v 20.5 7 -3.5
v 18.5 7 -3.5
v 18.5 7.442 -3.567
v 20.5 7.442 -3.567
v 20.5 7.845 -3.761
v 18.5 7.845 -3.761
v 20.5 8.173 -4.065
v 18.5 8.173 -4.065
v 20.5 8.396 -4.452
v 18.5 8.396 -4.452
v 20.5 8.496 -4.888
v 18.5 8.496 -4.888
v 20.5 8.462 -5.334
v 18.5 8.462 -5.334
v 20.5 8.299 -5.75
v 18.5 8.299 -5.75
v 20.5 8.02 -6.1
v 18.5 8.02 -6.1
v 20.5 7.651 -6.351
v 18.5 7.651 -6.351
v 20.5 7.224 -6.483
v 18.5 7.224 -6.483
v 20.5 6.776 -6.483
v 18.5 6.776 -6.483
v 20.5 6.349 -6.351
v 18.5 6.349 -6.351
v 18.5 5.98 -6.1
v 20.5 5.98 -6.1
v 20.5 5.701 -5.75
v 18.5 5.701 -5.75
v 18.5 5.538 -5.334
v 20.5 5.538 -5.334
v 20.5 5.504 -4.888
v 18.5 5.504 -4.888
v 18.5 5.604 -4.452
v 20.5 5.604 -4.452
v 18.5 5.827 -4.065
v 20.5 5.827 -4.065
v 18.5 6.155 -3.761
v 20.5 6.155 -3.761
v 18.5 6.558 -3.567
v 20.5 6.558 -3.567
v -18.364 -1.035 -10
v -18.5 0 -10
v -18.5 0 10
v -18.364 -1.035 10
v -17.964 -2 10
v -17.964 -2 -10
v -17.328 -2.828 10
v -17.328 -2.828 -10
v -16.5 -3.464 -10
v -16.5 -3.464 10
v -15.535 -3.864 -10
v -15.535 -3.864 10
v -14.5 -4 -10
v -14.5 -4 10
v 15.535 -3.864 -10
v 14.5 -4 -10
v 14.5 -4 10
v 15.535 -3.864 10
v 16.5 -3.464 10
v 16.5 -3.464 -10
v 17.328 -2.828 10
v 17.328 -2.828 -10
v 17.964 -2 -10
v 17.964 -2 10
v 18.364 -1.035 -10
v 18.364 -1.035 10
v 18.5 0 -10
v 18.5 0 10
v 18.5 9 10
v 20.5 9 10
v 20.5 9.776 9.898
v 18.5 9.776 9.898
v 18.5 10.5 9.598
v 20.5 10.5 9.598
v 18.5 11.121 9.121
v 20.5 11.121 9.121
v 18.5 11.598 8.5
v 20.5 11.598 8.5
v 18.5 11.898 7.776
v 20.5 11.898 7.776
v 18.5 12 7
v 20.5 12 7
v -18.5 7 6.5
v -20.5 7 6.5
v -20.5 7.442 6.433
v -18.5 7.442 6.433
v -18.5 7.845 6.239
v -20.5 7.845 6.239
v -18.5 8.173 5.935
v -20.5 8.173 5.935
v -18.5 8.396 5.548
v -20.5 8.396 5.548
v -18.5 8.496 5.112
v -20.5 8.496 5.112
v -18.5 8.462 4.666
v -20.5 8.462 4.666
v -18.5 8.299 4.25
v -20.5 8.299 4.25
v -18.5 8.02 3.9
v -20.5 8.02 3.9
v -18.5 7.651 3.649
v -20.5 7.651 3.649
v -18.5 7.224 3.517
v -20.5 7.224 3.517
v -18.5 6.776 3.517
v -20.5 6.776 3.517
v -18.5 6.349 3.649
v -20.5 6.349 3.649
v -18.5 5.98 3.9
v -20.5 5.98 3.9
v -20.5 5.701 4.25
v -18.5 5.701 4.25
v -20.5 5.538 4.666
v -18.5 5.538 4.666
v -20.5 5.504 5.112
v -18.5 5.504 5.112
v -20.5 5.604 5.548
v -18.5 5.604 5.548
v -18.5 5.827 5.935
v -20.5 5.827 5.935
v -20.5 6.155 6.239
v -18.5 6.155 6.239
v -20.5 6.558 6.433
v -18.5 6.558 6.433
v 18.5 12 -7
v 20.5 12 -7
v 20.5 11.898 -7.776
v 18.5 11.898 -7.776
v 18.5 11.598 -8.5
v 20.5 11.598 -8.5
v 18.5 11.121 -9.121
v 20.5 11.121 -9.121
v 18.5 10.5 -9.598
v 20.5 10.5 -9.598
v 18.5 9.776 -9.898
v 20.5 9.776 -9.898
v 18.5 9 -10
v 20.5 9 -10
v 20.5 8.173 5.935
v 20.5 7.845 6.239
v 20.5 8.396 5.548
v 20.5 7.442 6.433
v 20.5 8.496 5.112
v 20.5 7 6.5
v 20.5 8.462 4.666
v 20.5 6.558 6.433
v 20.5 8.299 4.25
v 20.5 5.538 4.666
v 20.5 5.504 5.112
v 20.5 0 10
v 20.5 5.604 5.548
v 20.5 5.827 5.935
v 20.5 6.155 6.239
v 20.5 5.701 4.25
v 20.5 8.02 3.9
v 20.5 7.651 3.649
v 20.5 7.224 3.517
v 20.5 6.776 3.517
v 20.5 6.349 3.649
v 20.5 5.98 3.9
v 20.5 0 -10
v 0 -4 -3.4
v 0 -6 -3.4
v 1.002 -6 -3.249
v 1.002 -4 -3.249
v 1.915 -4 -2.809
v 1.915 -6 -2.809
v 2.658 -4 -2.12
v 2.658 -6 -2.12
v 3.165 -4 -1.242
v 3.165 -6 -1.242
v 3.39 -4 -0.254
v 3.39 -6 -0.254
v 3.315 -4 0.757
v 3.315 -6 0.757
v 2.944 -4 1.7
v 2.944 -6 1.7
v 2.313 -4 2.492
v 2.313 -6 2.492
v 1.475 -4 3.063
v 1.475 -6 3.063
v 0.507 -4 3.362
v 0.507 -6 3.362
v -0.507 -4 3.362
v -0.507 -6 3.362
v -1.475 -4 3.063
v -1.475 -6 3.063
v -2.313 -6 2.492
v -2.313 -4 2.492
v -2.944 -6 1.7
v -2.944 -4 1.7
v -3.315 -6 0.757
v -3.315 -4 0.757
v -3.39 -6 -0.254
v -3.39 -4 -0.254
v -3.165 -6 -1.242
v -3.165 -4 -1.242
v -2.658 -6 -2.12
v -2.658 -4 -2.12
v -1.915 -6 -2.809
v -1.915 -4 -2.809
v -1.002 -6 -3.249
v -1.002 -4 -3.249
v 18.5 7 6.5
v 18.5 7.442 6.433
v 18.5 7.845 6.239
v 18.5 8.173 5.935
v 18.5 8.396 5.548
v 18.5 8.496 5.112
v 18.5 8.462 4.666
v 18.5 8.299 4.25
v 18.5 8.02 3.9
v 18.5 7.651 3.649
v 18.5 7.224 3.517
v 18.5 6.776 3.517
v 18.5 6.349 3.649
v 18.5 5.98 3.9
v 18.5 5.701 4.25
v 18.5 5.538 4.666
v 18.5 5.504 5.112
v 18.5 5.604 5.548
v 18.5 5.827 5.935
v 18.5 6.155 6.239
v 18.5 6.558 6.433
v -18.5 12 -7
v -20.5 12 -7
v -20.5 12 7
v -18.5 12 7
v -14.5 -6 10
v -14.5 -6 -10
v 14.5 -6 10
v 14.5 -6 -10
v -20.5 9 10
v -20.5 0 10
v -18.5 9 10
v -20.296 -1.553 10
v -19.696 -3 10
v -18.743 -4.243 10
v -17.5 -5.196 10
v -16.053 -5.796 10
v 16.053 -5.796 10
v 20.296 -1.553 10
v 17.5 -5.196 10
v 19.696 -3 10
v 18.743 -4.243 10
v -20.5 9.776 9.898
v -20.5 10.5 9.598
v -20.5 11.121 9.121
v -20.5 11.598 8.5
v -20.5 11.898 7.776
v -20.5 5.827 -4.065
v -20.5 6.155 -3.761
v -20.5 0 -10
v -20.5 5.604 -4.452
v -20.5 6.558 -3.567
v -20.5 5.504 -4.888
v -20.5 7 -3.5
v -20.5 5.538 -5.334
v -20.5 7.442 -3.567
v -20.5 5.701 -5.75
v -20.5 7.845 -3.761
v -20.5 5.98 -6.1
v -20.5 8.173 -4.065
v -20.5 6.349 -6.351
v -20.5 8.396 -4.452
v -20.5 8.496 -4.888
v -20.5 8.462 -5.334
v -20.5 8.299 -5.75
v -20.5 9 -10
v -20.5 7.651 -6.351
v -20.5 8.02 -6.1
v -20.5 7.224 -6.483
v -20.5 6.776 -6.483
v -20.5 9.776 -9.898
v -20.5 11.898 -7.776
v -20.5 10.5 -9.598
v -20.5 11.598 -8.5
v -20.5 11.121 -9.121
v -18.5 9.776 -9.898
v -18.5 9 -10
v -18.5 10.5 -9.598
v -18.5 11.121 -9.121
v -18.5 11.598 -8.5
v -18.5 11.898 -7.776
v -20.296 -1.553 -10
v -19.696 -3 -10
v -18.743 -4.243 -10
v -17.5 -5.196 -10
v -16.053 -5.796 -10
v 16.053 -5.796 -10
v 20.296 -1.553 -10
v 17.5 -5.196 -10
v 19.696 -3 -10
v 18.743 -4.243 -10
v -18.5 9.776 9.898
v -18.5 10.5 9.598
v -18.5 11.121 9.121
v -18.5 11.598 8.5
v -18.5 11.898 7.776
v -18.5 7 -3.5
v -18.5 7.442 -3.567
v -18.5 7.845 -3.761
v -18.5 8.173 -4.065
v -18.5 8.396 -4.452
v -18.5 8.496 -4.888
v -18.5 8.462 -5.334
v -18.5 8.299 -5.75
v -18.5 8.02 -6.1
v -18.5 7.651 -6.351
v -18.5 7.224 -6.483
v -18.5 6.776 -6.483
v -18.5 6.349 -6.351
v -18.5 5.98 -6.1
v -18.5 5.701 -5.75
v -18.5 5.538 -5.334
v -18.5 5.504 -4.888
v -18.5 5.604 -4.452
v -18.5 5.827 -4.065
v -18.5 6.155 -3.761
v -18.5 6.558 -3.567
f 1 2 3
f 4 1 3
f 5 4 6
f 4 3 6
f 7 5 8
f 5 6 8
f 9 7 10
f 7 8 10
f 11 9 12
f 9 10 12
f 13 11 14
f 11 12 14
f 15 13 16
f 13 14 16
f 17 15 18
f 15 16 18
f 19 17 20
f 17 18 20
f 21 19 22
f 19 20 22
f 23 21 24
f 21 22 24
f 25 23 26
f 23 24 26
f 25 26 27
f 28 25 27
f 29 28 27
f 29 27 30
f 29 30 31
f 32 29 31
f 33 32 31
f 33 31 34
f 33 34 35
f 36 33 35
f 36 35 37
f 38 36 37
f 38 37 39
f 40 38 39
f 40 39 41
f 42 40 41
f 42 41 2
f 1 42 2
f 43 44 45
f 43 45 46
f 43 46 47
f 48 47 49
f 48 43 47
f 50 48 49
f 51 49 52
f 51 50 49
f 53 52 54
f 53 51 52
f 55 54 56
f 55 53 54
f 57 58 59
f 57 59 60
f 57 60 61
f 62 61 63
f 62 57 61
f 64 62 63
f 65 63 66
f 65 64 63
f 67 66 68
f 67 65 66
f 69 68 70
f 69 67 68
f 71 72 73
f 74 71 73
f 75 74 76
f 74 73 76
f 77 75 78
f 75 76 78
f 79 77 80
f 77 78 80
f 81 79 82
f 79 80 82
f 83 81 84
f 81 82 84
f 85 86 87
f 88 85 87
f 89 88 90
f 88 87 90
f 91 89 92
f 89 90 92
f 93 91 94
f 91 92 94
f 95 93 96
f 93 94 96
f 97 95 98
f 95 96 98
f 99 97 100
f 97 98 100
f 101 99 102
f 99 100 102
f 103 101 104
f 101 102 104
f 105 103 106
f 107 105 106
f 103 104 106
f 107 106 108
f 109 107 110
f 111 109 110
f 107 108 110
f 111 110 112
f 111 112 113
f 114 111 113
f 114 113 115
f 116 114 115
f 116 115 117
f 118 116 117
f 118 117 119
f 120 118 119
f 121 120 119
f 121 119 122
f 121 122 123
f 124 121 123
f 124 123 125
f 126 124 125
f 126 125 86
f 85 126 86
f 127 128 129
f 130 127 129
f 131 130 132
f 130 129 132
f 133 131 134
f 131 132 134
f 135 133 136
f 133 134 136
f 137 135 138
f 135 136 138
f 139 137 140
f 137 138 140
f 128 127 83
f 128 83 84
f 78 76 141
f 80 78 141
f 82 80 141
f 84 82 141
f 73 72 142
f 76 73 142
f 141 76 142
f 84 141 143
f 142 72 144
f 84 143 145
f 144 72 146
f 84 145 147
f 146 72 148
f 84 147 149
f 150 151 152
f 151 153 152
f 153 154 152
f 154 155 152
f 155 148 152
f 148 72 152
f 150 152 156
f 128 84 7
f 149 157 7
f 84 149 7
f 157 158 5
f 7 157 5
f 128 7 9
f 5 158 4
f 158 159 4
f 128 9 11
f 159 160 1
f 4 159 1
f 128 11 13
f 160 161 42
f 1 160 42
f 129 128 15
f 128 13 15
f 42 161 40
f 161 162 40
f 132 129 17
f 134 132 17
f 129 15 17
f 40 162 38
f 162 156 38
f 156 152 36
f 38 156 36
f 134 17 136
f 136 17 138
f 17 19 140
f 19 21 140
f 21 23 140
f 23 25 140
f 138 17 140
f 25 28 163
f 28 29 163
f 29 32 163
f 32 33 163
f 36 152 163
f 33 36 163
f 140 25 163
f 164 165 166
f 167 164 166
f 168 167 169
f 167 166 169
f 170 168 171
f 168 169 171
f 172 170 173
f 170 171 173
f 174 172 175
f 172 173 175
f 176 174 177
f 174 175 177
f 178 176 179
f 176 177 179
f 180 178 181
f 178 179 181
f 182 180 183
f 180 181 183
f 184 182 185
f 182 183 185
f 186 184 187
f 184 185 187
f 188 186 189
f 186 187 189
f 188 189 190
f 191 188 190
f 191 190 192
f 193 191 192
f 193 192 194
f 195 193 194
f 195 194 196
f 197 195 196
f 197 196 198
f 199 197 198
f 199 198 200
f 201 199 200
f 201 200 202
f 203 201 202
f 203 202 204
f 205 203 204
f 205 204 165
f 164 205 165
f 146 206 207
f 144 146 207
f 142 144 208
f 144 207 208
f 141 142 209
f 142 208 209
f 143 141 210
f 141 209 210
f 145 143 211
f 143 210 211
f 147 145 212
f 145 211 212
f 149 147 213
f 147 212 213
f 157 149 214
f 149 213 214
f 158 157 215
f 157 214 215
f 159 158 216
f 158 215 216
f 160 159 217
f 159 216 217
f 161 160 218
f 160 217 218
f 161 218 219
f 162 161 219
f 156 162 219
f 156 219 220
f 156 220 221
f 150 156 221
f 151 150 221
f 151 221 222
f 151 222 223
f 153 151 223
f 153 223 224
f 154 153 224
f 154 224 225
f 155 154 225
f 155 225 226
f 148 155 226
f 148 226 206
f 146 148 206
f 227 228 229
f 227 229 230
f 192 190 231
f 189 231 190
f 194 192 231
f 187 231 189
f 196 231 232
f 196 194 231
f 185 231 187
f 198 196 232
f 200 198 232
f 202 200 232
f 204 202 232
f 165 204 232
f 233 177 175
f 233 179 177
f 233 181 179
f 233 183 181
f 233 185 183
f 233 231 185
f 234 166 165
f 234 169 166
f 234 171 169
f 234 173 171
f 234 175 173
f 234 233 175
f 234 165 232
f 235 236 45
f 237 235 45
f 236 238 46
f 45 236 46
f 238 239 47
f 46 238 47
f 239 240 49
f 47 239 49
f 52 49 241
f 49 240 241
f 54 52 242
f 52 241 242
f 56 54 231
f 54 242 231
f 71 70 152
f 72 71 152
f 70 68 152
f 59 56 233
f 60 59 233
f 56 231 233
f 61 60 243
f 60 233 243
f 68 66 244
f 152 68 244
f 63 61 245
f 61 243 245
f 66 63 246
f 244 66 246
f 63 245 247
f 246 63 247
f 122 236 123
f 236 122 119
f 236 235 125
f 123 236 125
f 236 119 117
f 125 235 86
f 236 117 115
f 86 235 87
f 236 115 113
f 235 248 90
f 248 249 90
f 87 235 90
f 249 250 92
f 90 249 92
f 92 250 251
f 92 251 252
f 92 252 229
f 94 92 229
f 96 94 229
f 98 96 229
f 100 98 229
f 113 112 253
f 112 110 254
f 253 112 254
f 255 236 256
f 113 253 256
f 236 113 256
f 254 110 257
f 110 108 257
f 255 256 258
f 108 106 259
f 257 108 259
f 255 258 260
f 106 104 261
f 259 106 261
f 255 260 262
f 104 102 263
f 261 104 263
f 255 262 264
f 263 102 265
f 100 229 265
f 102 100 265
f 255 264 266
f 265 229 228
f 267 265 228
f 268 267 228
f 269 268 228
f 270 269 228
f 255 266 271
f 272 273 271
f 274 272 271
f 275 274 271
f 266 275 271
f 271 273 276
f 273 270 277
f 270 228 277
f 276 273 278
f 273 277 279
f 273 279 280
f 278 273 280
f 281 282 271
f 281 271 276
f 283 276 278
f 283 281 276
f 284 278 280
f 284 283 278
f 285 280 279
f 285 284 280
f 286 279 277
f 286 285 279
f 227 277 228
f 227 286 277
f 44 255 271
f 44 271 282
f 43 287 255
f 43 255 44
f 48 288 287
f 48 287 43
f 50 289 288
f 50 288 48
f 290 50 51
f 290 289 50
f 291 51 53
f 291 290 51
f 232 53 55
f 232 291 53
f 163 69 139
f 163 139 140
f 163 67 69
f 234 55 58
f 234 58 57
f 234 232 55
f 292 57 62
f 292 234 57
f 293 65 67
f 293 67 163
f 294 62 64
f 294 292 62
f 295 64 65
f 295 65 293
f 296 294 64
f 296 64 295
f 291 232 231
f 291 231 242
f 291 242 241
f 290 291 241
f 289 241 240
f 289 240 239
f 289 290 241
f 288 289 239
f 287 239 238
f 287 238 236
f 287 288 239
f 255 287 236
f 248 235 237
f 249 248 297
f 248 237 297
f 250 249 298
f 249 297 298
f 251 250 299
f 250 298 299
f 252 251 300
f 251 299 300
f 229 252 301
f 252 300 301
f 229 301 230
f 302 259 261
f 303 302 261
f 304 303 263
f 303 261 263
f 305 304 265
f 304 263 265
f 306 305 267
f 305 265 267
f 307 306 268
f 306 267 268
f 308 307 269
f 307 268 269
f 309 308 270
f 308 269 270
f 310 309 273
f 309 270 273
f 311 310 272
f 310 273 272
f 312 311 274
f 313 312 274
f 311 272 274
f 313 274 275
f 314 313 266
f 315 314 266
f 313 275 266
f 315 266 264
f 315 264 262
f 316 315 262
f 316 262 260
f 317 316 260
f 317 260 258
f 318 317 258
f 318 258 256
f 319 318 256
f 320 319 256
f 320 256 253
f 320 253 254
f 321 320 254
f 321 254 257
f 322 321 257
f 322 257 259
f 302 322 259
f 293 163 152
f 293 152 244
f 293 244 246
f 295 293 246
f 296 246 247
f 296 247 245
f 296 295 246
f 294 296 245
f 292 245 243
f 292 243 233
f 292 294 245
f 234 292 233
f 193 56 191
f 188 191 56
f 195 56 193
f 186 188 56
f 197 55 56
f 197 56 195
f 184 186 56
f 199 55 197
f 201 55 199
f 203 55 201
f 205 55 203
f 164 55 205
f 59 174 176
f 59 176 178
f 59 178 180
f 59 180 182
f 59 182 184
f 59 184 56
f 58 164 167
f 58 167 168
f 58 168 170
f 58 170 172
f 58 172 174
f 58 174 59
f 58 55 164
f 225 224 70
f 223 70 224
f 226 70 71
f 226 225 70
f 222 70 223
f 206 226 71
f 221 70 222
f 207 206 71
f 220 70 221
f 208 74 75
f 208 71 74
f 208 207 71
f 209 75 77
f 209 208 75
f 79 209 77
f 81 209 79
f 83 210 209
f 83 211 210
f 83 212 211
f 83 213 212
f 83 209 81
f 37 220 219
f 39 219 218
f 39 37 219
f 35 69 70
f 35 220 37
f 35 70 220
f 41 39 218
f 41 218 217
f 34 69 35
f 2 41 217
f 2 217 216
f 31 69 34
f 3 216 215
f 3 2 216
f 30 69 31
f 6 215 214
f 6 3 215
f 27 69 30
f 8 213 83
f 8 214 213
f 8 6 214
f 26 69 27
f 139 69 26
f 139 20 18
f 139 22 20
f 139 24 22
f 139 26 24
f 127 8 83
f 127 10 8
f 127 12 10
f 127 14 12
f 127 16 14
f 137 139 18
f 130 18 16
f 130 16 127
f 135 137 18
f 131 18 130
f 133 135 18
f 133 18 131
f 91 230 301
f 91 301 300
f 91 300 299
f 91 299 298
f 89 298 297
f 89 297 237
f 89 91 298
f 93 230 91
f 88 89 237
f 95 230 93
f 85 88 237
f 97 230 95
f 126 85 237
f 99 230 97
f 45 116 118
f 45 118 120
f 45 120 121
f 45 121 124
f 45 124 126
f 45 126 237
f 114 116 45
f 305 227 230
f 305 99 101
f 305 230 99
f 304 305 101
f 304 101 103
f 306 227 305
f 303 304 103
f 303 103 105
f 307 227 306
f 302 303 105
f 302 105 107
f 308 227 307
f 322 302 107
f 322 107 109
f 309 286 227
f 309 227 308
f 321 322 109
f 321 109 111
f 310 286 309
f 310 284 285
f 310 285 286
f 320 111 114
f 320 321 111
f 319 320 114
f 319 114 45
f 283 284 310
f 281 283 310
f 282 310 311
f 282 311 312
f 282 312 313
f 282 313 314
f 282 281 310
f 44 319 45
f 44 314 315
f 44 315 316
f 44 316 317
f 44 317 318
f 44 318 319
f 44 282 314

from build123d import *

# Parameters (mm, degrees)
SKETCH1_W            = 20
SKETCH1_H            = 6
BOSS_EXTRUDE1_DEPTH  = 20.5
SKETCH2_W            = 3
SKETCH2_H            = 20
BOSS_EXTRUDE2_DEPTH  = 12
SKETCH7_R            = 1.5
CUT_EXTRUDE1_DEPTH   = 44.874821937
SKETCH8_R            = 3.4
CUT_EXTRUDE2_DEPTH   = 30.055980452
FILLET2_R            = 3
CONVERT_SOLID2_START = -10
CONVERT_SOLID2_DEPTH = 20


# Read off the part's stored shape, not the designer's step: Convert-Solid2
with BuildPart() as part:
    # Sketch1 → Boss-Extrude1 (new, symmetric)
    with BuildSketch(Plane(origin=(0, 0, 0), x_dir=(0, 0, -1), z_dir=(1, 0, 0))):
        with Locations((0, -3)):
            Rectangle(SKETCH1_W, SKETCH1_H)
    extrude(amount=BOSS_EXTRUDE1_DEPTH, both=True)

    # Sketch2 → Boss-Extrude2 (add)
    with BuildSketch(Plane(origin=(0, 0, 0), x_dir=(1, 0, 0), z_dir=(0, 1, 0))):
        with Locations((19, 0)):
            Rectangle(SKETCH2_W, SKETCH2_H)
        with Locations((-19, 0)):
            Rectangle(SKETCH2_W, SKETCH2_H)
    extrude(amount=BOSS_EXTRUDE2_DEPTH)

    # Sketch7 → Cut-Extrude1 (cut, through all)
    with BuildSketch(Plane.ZY.offset(20.5)):
        with Locations((-5, 7)):
            Circle(SKETCH7_R)
        with Locations((5, 7)):
            Circle(SKETCH7_R)
    extrude(amount=-CUT_EXTRUDE1_DEPTH, mode=Mode.SUBTRACT)

    # Sketch8 → Cut-Extrude2 (cut, through all)
    with BuildSketch(Plane.XZ.offset(6)):
        with Locations(Location((0, 0, 0), (0, 0, 270))):
            Circle(SKETCH8_R)
    extrude(amount=-CUT_EXTRUDE2_DEPTH, mode=Mode.SUBTRACT)

    # Fillet2
    fillet2_edges = [part.edges().sort_by_distance(p)[0] for p in [
        (-19, 12, 10),
        (-19, 12, -10),
        (19, 12, -10),
        (19, 12, 10),
    ]]
    fillet(fillet2_edges, radius=FILLET2_R)

    # Convert-Solid2 outline → Convert-Solid2 (cut)
    with BuildSketch(Plane.XY.offset(CONVERT_SOLID2_START)):
        with BuildLine():
            Line((20.5, -6), (20.5, 0))
            ThreePointArc((20.5, 0), (18.742640687, -4.242640687), (14.5, -6))
            Line((14.5, -6), (20.5, -6))
        make_face()
        with BuildLine():
            Line((-20.5, -6), (-14.5, -6))
            ThreePointArc((-14.5, -6), (-18.742640687, -4.242640687), (-20.5, 0))
            Line((-20.5, 0), (-20.5, -6))
        make_face()
        with BuildLine():
            Line((18.5, 0), (18.5, 12))
            Line((18.5, 12), (17.5, 12))
            Line((17.5, 12), (17.5, 0))
            Line((17.5, 0), (-17.5, 0))
            Line((-17.5, 0), (-17.5, 12))
            Line((-17.5, 12), (-18.5, 12))
            Line((-18.5, 12), (-18.5, 0))
            ThreePointArc((-18.5, 0), (-17.328427125, -2.828427125), (-14.5, -4))
            Line((-14.5, -4), (14.5, -4))
            ThreePointArc((14.5, -4), (17.328427125, -2.828427125), (18.5, 0))
        make_face()
    extrude(amount=CONVERT_SOLID2_DEPTH, mode=Mode.SUBTRACT)


solid = part.part
